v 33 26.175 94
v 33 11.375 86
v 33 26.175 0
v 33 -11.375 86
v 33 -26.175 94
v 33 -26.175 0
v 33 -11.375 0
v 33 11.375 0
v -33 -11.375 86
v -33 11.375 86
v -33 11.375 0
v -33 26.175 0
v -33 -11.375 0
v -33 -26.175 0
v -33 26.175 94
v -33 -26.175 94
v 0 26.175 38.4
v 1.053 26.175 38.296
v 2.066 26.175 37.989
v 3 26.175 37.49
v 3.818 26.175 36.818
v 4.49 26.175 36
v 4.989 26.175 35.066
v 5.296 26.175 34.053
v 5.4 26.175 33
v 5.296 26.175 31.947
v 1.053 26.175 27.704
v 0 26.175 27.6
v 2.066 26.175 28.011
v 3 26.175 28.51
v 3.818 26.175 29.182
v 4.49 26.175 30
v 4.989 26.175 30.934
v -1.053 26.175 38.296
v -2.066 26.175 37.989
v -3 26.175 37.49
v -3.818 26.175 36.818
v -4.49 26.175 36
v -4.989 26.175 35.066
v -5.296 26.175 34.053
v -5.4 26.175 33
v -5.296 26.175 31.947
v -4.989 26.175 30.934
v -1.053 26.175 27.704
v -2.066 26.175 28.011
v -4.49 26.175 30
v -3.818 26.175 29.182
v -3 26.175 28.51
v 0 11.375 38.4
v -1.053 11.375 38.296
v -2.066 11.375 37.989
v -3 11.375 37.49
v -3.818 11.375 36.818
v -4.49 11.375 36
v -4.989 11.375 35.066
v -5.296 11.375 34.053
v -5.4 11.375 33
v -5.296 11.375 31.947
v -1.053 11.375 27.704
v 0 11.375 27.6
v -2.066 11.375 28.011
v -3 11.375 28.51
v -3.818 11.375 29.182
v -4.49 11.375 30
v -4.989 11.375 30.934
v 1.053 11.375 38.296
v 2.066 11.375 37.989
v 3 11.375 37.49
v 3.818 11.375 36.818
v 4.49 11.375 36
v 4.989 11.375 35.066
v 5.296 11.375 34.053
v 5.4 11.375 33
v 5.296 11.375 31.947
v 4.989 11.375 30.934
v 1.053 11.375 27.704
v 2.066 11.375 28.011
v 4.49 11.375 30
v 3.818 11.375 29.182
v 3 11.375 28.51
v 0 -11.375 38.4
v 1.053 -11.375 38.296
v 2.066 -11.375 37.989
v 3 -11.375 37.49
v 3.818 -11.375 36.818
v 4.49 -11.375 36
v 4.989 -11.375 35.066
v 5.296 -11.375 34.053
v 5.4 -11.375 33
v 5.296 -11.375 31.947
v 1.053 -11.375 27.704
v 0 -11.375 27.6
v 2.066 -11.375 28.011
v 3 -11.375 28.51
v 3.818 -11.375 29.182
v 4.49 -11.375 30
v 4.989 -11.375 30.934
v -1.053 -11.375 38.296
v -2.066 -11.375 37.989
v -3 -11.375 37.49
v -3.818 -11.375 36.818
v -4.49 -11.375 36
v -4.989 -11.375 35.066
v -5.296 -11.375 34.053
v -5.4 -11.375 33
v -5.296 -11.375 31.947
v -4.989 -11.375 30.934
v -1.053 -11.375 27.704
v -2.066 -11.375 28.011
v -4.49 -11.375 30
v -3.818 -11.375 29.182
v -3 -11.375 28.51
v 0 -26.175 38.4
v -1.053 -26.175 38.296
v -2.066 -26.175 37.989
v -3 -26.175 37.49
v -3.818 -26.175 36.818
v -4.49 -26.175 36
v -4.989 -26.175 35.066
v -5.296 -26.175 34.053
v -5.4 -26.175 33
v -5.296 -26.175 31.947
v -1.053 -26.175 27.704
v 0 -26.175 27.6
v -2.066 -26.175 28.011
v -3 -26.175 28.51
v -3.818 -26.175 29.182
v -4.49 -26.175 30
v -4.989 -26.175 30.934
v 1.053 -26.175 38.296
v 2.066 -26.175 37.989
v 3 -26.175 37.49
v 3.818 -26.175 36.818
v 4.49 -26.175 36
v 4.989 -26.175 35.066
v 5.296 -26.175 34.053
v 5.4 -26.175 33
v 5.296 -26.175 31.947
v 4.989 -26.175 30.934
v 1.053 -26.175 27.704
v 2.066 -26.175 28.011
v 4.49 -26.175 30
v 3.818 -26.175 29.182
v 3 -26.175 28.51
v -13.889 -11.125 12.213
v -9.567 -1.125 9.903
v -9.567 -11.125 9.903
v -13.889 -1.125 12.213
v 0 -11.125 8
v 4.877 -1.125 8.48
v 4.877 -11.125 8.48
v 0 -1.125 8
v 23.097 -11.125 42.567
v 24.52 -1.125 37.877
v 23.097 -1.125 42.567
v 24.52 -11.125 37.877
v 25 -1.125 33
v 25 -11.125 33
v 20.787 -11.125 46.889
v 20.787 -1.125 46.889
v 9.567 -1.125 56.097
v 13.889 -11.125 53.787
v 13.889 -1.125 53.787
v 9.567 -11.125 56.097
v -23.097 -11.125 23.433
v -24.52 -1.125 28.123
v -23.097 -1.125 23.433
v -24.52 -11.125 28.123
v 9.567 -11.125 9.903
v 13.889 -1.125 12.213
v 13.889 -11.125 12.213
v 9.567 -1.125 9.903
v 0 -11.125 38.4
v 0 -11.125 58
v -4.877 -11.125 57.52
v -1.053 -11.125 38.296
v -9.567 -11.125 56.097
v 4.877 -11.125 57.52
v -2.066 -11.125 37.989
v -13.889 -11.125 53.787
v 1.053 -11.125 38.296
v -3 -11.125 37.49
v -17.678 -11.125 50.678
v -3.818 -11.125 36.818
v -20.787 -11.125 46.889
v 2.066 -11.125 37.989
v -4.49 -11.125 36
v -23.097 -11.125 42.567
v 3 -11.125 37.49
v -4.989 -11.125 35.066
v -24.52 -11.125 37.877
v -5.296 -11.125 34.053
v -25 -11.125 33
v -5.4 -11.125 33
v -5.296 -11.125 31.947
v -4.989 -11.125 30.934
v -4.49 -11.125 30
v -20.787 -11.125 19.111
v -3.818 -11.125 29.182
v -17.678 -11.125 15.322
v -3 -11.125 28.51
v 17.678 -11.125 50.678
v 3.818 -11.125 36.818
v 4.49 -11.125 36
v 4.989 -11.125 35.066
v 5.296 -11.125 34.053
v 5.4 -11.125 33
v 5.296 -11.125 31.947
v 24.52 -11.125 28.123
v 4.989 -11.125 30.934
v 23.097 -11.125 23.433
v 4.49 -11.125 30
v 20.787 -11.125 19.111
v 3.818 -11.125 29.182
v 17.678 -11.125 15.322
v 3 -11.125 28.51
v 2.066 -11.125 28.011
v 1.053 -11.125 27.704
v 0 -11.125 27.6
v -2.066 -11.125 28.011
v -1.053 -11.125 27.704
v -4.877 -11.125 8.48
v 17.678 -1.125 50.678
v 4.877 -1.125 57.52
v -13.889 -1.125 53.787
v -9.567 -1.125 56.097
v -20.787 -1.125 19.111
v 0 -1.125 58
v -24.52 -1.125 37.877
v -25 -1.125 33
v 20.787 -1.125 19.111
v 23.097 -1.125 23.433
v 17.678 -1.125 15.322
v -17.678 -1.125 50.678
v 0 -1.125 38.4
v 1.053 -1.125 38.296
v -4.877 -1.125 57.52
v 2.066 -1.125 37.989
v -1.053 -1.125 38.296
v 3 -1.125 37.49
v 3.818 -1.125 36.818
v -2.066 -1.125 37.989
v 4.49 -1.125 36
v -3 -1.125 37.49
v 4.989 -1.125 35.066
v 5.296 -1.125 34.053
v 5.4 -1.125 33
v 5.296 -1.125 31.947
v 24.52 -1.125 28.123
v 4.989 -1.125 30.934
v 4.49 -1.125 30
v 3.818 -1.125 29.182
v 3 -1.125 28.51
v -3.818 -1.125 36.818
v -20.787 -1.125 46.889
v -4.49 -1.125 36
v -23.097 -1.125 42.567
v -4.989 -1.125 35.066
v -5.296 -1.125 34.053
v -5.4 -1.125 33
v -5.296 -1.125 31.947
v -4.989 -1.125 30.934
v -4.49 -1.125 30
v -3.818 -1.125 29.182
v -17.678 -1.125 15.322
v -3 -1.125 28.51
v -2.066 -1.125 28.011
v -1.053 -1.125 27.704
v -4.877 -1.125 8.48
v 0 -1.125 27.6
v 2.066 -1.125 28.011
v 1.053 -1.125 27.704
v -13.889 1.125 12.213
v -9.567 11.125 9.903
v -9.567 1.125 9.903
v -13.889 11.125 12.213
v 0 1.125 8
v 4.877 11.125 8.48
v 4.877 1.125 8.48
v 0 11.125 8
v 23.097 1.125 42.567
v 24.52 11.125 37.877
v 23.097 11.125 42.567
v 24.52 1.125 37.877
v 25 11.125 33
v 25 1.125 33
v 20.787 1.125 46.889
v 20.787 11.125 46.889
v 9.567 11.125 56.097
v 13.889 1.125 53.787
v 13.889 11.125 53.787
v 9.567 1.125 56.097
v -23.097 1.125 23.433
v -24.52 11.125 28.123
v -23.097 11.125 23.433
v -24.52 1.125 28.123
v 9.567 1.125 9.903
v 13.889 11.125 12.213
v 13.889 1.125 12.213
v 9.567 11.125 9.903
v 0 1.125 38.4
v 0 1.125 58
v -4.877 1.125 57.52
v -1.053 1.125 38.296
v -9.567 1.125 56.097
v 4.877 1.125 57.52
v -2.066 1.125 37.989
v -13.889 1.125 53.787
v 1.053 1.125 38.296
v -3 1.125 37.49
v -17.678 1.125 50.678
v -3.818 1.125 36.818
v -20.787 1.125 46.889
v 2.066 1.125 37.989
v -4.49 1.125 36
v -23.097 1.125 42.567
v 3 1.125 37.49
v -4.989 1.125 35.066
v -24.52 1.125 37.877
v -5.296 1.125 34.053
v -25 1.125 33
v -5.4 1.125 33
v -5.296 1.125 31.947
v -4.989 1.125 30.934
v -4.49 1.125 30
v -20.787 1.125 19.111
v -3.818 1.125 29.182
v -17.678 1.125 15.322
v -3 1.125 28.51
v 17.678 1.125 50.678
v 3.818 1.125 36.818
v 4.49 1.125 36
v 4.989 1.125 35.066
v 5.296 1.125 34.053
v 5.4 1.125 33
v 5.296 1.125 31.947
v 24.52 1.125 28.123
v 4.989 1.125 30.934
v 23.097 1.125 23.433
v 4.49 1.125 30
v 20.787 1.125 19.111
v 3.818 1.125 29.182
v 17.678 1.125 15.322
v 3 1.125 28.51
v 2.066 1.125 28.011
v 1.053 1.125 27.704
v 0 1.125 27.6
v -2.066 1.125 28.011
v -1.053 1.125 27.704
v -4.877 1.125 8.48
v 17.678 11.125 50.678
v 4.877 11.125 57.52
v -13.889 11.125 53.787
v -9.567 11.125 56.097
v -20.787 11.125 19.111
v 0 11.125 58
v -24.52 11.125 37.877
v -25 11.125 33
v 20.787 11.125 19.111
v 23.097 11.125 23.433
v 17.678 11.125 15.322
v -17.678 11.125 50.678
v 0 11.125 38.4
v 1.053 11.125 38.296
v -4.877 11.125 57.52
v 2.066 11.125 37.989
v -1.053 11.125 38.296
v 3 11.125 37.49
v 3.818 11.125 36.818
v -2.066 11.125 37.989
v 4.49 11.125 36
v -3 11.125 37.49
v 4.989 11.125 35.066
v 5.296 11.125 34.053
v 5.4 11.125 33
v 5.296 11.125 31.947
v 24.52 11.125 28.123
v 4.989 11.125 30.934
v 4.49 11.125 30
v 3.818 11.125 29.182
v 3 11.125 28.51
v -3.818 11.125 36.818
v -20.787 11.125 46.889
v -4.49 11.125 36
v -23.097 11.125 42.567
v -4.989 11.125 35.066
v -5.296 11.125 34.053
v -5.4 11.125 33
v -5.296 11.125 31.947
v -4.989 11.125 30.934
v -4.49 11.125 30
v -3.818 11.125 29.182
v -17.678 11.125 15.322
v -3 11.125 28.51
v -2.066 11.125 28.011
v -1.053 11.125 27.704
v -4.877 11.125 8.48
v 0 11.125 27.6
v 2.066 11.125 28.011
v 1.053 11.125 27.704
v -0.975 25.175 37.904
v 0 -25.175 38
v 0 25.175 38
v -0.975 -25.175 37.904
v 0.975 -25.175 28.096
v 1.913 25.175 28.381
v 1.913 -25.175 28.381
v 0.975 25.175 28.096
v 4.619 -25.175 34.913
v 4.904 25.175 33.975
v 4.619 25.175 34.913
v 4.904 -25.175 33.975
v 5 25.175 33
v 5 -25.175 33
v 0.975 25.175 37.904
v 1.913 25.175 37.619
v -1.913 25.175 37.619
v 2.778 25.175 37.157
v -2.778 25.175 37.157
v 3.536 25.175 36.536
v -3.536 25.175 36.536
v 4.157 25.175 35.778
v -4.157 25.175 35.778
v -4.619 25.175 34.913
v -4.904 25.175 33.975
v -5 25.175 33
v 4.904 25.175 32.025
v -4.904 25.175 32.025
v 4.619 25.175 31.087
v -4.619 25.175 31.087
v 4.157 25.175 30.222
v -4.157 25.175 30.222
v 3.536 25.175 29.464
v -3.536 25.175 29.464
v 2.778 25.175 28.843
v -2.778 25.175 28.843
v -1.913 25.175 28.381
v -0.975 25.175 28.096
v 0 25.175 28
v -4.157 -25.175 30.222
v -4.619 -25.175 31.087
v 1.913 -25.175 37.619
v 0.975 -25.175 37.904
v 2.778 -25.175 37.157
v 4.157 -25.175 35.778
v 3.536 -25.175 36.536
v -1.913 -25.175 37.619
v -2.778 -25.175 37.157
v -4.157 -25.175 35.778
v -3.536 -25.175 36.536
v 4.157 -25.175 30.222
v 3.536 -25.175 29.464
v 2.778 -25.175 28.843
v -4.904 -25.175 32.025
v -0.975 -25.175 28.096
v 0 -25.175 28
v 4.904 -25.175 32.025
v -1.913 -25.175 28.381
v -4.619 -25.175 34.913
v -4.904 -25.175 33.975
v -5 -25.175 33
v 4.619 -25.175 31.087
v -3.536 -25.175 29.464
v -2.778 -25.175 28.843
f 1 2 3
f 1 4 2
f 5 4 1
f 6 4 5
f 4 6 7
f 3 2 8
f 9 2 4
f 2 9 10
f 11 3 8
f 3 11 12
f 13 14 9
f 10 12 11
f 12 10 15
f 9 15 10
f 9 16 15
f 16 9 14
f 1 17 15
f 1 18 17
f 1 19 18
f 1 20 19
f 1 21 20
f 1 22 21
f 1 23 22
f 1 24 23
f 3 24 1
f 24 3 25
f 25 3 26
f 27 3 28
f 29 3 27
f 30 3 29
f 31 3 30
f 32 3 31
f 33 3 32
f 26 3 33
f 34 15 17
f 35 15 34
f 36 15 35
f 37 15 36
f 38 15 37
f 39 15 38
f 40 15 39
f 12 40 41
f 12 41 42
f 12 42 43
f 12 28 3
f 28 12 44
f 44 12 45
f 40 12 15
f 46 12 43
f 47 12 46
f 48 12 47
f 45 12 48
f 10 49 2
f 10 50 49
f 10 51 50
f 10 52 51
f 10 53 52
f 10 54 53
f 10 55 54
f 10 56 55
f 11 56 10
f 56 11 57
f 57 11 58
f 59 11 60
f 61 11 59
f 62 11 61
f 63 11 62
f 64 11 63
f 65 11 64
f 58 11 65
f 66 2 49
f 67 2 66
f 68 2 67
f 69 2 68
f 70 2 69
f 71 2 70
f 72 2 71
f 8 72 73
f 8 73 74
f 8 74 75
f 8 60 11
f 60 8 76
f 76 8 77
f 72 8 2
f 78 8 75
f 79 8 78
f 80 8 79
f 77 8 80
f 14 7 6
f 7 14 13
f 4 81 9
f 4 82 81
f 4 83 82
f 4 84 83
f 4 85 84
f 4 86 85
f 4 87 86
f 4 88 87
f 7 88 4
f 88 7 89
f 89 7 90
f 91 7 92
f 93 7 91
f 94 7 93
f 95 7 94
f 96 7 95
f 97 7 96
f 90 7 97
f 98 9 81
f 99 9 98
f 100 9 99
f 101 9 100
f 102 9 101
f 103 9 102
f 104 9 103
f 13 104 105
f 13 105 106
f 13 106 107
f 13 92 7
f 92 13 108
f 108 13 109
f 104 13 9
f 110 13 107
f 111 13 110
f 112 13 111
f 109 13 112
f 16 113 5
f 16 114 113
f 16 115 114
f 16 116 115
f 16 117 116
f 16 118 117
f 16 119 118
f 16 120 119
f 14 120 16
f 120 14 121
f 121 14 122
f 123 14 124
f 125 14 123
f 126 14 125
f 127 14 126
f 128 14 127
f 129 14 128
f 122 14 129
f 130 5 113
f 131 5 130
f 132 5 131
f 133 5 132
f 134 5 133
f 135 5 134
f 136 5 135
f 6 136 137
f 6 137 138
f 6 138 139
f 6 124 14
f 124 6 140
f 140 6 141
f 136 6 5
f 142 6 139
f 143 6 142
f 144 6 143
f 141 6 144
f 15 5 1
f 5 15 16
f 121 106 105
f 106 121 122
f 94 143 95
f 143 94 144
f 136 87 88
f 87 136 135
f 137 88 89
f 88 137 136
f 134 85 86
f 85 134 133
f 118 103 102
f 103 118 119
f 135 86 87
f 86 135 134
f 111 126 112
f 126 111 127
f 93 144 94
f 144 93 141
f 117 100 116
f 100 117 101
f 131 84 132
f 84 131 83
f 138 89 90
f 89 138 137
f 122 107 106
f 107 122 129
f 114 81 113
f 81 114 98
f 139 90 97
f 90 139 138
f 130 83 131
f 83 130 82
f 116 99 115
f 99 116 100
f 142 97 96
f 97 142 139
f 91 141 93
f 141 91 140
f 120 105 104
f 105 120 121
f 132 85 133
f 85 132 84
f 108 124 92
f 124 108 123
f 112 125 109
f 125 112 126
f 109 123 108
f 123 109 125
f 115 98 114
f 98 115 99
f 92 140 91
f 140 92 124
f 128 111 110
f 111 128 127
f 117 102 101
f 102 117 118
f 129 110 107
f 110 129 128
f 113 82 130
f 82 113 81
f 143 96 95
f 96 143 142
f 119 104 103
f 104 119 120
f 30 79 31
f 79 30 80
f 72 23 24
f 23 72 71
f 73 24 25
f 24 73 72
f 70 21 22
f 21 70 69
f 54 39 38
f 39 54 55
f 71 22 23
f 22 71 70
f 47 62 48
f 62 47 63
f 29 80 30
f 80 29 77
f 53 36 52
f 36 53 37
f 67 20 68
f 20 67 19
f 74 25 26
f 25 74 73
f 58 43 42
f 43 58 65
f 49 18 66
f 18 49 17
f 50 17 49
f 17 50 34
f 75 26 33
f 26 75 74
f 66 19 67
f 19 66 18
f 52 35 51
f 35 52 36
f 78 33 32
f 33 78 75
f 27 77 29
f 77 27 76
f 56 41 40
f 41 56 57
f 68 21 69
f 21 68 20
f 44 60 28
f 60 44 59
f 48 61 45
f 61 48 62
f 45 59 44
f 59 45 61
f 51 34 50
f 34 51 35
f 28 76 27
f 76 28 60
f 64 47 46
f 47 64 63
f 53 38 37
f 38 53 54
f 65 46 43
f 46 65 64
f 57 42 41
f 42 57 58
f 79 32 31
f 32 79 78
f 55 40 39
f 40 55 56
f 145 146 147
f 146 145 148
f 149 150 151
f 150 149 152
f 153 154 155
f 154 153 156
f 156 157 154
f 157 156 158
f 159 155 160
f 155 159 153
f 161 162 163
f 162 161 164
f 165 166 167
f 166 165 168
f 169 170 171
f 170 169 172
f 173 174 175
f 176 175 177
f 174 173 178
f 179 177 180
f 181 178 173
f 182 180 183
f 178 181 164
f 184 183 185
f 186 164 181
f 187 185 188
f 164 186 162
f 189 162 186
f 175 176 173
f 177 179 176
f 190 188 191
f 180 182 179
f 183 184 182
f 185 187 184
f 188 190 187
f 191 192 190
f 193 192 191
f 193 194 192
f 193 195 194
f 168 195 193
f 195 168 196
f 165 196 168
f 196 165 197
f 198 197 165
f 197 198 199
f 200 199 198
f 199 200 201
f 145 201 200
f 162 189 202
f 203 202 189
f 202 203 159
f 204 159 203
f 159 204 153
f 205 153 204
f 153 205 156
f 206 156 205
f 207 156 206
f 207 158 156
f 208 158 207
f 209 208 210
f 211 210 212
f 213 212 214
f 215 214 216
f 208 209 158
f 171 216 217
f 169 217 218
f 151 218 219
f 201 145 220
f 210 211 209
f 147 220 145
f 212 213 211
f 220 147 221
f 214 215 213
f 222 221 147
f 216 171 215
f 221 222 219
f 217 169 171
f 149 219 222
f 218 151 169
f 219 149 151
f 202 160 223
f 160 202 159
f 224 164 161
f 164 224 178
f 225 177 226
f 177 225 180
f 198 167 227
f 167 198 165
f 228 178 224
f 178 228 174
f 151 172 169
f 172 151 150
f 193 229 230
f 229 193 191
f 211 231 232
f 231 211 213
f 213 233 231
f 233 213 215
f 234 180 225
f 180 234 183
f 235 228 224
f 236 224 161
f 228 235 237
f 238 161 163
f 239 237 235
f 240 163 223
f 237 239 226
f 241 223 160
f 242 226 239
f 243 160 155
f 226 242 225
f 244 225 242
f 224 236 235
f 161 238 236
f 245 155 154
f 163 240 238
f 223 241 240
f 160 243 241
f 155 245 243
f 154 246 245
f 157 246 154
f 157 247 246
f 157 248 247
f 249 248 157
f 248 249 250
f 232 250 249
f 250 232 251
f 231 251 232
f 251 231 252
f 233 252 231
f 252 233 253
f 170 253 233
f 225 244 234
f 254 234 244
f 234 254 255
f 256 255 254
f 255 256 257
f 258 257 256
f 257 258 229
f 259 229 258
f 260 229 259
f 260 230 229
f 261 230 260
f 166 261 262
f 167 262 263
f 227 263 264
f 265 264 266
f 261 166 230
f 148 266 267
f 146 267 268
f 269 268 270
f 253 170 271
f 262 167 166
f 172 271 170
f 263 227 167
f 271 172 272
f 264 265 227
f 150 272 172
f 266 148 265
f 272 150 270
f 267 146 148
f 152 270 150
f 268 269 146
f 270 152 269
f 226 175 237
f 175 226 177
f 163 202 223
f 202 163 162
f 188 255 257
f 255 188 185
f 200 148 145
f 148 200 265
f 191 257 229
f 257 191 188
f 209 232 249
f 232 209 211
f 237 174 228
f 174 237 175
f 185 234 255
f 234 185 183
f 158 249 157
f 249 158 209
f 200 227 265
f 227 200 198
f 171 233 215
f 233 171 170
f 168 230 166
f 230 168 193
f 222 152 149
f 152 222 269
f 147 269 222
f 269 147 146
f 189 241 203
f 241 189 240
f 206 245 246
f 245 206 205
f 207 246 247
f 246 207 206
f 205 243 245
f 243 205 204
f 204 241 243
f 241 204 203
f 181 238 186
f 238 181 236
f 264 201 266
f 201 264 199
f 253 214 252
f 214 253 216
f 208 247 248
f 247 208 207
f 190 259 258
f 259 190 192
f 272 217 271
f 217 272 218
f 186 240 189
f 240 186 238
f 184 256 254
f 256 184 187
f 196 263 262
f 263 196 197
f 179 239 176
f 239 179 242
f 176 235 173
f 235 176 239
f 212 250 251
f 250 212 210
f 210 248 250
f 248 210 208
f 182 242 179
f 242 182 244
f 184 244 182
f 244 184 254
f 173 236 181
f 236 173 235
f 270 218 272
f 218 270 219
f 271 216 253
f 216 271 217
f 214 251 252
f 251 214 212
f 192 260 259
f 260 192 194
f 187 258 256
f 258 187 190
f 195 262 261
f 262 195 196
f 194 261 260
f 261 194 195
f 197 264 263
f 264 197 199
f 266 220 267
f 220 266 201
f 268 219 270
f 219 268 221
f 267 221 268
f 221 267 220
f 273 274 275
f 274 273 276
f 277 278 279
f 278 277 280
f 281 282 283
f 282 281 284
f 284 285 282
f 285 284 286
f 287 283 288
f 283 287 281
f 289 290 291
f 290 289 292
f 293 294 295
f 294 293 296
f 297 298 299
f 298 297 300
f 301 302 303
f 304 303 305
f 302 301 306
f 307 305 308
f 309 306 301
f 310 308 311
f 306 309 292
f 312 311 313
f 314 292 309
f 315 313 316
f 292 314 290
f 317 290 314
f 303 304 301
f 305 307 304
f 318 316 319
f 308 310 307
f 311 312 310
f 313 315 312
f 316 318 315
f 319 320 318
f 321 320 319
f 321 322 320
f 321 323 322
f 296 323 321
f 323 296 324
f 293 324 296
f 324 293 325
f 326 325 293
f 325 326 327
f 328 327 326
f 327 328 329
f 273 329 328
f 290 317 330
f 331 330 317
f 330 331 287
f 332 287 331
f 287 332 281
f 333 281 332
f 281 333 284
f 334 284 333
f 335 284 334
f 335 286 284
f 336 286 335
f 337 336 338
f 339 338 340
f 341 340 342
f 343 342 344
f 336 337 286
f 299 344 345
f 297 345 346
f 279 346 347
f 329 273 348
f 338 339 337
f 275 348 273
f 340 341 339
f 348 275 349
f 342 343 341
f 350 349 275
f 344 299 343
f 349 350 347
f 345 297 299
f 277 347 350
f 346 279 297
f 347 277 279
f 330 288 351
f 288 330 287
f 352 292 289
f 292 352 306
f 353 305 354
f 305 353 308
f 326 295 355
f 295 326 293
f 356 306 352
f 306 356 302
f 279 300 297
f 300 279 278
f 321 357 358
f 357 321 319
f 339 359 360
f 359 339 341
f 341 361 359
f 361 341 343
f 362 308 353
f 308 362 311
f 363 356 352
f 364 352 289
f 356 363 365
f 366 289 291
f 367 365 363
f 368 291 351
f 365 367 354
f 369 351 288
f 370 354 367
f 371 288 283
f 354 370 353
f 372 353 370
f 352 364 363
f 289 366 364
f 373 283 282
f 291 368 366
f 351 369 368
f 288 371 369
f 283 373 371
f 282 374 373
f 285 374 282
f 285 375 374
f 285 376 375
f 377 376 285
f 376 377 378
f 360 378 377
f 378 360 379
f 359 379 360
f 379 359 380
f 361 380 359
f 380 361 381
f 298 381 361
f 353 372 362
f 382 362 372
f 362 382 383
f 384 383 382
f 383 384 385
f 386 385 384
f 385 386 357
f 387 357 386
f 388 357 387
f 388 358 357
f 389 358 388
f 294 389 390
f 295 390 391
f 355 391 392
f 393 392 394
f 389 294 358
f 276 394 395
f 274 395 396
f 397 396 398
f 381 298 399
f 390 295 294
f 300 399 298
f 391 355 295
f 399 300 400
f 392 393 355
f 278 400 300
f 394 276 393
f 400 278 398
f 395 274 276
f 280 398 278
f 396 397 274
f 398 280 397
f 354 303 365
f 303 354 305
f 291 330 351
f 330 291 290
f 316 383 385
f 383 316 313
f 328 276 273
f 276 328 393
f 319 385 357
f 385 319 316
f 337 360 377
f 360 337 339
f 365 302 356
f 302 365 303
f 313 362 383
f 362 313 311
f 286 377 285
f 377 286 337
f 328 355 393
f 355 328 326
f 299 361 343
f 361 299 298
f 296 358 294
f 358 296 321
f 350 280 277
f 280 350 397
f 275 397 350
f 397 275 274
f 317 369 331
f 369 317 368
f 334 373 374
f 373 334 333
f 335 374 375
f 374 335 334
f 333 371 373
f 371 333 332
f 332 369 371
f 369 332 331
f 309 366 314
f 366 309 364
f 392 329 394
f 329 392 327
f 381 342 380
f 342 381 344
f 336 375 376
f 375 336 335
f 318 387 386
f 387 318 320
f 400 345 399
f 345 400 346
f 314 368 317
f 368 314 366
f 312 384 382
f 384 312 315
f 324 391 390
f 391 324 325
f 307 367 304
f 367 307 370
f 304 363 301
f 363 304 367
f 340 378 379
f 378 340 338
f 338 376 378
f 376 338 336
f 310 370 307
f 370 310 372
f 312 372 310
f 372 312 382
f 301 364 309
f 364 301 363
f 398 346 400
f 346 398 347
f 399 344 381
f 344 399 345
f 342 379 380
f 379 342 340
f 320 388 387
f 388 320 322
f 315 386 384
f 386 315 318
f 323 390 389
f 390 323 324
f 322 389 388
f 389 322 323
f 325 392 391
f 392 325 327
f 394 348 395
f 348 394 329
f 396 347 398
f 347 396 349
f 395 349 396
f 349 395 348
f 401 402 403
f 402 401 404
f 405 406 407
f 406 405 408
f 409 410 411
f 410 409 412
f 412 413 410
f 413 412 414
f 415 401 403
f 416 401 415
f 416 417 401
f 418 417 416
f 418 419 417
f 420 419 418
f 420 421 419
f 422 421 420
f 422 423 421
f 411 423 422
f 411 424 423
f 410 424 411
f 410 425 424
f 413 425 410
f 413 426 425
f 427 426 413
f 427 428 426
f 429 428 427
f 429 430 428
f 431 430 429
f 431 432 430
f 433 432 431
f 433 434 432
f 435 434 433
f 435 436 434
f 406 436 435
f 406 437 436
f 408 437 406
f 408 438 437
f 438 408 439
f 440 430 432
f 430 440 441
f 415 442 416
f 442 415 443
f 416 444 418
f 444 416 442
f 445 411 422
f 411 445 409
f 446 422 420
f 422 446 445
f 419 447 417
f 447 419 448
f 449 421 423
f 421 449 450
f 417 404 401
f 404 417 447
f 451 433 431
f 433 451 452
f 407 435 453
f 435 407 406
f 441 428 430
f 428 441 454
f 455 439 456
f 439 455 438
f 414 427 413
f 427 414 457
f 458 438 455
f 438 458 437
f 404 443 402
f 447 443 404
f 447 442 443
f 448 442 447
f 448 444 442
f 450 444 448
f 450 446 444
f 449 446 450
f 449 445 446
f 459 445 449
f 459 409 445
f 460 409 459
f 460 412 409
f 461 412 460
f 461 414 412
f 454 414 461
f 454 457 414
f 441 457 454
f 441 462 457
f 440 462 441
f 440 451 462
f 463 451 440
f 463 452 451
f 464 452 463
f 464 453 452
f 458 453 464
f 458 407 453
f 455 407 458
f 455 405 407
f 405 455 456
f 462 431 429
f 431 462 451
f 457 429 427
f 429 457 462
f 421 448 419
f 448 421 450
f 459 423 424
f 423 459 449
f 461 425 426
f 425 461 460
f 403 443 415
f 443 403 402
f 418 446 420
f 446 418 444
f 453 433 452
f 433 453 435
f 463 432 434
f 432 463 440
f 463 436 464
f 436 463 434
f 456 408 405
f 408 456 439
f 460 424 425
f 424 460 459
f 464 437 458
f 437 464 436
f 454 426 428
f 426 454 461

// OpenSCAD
$fn = 32;

// ------------------------------------------------------------------------
// Trolley wheel set: wheels d50, fork 86 mm tall
// Every part is its own module, assembly() places every instance.
// ------------------------------------------------------------------------

// --- part 1 ---
module trolley_fork() {
  difference() {
    union() {
      translate([-33, 11.375, 0]) cube([66, 14.8, 86]);
      translate([-33, -26.175, 0]) cube([66, 14.8, 86]);
      translate([-33, -26.175, 86]) cube([66, 52.35, 8]);
    }
    translate([0, -18.775, 33]) rotate([90, 0, 0]) cylinder(h = 16.8, d = 10.8, center = true);
    translate([0, 18.775, 33]) rotate([90, 0, 0]) cylinder(h = 16.8, d = 10.8, center = true);
  }
}

// --- part 2 ---
module trolley_wheel() {
  difference() {
      translate([0, 0, 0]) cylinder(h = 10, d = 50);
      translate([0, 0, -1]) cylinder(h = 12, d = 10.8);
    }
}

// --- part 3 ---
module trolley_axle() {
  translate([0, 0, -25.175]) cylinder(h = 50.35, d = 10);
}

// --- assembly ---
module assembly() {
  color([0.80, 0.24, 0.20]) translate([0, 0, 0]) rotate([0, 0, 0]) trolley_fork();
  color([0.20, 0.45, 0.75]) translate([0, -1.125, 33]) rotate([90, 0, 0]) trolley_wheel();
  color([0.25, 0.62, 0.32]) translate([0, 11.125, 33]) rotate([90, 0, 0]) trolley_wheel();
  color([0.92, 0.70, 0.18]) translate([0, 0, 33]) rotate([90, 0, 0]) trolley_axle();
}

assembly();
